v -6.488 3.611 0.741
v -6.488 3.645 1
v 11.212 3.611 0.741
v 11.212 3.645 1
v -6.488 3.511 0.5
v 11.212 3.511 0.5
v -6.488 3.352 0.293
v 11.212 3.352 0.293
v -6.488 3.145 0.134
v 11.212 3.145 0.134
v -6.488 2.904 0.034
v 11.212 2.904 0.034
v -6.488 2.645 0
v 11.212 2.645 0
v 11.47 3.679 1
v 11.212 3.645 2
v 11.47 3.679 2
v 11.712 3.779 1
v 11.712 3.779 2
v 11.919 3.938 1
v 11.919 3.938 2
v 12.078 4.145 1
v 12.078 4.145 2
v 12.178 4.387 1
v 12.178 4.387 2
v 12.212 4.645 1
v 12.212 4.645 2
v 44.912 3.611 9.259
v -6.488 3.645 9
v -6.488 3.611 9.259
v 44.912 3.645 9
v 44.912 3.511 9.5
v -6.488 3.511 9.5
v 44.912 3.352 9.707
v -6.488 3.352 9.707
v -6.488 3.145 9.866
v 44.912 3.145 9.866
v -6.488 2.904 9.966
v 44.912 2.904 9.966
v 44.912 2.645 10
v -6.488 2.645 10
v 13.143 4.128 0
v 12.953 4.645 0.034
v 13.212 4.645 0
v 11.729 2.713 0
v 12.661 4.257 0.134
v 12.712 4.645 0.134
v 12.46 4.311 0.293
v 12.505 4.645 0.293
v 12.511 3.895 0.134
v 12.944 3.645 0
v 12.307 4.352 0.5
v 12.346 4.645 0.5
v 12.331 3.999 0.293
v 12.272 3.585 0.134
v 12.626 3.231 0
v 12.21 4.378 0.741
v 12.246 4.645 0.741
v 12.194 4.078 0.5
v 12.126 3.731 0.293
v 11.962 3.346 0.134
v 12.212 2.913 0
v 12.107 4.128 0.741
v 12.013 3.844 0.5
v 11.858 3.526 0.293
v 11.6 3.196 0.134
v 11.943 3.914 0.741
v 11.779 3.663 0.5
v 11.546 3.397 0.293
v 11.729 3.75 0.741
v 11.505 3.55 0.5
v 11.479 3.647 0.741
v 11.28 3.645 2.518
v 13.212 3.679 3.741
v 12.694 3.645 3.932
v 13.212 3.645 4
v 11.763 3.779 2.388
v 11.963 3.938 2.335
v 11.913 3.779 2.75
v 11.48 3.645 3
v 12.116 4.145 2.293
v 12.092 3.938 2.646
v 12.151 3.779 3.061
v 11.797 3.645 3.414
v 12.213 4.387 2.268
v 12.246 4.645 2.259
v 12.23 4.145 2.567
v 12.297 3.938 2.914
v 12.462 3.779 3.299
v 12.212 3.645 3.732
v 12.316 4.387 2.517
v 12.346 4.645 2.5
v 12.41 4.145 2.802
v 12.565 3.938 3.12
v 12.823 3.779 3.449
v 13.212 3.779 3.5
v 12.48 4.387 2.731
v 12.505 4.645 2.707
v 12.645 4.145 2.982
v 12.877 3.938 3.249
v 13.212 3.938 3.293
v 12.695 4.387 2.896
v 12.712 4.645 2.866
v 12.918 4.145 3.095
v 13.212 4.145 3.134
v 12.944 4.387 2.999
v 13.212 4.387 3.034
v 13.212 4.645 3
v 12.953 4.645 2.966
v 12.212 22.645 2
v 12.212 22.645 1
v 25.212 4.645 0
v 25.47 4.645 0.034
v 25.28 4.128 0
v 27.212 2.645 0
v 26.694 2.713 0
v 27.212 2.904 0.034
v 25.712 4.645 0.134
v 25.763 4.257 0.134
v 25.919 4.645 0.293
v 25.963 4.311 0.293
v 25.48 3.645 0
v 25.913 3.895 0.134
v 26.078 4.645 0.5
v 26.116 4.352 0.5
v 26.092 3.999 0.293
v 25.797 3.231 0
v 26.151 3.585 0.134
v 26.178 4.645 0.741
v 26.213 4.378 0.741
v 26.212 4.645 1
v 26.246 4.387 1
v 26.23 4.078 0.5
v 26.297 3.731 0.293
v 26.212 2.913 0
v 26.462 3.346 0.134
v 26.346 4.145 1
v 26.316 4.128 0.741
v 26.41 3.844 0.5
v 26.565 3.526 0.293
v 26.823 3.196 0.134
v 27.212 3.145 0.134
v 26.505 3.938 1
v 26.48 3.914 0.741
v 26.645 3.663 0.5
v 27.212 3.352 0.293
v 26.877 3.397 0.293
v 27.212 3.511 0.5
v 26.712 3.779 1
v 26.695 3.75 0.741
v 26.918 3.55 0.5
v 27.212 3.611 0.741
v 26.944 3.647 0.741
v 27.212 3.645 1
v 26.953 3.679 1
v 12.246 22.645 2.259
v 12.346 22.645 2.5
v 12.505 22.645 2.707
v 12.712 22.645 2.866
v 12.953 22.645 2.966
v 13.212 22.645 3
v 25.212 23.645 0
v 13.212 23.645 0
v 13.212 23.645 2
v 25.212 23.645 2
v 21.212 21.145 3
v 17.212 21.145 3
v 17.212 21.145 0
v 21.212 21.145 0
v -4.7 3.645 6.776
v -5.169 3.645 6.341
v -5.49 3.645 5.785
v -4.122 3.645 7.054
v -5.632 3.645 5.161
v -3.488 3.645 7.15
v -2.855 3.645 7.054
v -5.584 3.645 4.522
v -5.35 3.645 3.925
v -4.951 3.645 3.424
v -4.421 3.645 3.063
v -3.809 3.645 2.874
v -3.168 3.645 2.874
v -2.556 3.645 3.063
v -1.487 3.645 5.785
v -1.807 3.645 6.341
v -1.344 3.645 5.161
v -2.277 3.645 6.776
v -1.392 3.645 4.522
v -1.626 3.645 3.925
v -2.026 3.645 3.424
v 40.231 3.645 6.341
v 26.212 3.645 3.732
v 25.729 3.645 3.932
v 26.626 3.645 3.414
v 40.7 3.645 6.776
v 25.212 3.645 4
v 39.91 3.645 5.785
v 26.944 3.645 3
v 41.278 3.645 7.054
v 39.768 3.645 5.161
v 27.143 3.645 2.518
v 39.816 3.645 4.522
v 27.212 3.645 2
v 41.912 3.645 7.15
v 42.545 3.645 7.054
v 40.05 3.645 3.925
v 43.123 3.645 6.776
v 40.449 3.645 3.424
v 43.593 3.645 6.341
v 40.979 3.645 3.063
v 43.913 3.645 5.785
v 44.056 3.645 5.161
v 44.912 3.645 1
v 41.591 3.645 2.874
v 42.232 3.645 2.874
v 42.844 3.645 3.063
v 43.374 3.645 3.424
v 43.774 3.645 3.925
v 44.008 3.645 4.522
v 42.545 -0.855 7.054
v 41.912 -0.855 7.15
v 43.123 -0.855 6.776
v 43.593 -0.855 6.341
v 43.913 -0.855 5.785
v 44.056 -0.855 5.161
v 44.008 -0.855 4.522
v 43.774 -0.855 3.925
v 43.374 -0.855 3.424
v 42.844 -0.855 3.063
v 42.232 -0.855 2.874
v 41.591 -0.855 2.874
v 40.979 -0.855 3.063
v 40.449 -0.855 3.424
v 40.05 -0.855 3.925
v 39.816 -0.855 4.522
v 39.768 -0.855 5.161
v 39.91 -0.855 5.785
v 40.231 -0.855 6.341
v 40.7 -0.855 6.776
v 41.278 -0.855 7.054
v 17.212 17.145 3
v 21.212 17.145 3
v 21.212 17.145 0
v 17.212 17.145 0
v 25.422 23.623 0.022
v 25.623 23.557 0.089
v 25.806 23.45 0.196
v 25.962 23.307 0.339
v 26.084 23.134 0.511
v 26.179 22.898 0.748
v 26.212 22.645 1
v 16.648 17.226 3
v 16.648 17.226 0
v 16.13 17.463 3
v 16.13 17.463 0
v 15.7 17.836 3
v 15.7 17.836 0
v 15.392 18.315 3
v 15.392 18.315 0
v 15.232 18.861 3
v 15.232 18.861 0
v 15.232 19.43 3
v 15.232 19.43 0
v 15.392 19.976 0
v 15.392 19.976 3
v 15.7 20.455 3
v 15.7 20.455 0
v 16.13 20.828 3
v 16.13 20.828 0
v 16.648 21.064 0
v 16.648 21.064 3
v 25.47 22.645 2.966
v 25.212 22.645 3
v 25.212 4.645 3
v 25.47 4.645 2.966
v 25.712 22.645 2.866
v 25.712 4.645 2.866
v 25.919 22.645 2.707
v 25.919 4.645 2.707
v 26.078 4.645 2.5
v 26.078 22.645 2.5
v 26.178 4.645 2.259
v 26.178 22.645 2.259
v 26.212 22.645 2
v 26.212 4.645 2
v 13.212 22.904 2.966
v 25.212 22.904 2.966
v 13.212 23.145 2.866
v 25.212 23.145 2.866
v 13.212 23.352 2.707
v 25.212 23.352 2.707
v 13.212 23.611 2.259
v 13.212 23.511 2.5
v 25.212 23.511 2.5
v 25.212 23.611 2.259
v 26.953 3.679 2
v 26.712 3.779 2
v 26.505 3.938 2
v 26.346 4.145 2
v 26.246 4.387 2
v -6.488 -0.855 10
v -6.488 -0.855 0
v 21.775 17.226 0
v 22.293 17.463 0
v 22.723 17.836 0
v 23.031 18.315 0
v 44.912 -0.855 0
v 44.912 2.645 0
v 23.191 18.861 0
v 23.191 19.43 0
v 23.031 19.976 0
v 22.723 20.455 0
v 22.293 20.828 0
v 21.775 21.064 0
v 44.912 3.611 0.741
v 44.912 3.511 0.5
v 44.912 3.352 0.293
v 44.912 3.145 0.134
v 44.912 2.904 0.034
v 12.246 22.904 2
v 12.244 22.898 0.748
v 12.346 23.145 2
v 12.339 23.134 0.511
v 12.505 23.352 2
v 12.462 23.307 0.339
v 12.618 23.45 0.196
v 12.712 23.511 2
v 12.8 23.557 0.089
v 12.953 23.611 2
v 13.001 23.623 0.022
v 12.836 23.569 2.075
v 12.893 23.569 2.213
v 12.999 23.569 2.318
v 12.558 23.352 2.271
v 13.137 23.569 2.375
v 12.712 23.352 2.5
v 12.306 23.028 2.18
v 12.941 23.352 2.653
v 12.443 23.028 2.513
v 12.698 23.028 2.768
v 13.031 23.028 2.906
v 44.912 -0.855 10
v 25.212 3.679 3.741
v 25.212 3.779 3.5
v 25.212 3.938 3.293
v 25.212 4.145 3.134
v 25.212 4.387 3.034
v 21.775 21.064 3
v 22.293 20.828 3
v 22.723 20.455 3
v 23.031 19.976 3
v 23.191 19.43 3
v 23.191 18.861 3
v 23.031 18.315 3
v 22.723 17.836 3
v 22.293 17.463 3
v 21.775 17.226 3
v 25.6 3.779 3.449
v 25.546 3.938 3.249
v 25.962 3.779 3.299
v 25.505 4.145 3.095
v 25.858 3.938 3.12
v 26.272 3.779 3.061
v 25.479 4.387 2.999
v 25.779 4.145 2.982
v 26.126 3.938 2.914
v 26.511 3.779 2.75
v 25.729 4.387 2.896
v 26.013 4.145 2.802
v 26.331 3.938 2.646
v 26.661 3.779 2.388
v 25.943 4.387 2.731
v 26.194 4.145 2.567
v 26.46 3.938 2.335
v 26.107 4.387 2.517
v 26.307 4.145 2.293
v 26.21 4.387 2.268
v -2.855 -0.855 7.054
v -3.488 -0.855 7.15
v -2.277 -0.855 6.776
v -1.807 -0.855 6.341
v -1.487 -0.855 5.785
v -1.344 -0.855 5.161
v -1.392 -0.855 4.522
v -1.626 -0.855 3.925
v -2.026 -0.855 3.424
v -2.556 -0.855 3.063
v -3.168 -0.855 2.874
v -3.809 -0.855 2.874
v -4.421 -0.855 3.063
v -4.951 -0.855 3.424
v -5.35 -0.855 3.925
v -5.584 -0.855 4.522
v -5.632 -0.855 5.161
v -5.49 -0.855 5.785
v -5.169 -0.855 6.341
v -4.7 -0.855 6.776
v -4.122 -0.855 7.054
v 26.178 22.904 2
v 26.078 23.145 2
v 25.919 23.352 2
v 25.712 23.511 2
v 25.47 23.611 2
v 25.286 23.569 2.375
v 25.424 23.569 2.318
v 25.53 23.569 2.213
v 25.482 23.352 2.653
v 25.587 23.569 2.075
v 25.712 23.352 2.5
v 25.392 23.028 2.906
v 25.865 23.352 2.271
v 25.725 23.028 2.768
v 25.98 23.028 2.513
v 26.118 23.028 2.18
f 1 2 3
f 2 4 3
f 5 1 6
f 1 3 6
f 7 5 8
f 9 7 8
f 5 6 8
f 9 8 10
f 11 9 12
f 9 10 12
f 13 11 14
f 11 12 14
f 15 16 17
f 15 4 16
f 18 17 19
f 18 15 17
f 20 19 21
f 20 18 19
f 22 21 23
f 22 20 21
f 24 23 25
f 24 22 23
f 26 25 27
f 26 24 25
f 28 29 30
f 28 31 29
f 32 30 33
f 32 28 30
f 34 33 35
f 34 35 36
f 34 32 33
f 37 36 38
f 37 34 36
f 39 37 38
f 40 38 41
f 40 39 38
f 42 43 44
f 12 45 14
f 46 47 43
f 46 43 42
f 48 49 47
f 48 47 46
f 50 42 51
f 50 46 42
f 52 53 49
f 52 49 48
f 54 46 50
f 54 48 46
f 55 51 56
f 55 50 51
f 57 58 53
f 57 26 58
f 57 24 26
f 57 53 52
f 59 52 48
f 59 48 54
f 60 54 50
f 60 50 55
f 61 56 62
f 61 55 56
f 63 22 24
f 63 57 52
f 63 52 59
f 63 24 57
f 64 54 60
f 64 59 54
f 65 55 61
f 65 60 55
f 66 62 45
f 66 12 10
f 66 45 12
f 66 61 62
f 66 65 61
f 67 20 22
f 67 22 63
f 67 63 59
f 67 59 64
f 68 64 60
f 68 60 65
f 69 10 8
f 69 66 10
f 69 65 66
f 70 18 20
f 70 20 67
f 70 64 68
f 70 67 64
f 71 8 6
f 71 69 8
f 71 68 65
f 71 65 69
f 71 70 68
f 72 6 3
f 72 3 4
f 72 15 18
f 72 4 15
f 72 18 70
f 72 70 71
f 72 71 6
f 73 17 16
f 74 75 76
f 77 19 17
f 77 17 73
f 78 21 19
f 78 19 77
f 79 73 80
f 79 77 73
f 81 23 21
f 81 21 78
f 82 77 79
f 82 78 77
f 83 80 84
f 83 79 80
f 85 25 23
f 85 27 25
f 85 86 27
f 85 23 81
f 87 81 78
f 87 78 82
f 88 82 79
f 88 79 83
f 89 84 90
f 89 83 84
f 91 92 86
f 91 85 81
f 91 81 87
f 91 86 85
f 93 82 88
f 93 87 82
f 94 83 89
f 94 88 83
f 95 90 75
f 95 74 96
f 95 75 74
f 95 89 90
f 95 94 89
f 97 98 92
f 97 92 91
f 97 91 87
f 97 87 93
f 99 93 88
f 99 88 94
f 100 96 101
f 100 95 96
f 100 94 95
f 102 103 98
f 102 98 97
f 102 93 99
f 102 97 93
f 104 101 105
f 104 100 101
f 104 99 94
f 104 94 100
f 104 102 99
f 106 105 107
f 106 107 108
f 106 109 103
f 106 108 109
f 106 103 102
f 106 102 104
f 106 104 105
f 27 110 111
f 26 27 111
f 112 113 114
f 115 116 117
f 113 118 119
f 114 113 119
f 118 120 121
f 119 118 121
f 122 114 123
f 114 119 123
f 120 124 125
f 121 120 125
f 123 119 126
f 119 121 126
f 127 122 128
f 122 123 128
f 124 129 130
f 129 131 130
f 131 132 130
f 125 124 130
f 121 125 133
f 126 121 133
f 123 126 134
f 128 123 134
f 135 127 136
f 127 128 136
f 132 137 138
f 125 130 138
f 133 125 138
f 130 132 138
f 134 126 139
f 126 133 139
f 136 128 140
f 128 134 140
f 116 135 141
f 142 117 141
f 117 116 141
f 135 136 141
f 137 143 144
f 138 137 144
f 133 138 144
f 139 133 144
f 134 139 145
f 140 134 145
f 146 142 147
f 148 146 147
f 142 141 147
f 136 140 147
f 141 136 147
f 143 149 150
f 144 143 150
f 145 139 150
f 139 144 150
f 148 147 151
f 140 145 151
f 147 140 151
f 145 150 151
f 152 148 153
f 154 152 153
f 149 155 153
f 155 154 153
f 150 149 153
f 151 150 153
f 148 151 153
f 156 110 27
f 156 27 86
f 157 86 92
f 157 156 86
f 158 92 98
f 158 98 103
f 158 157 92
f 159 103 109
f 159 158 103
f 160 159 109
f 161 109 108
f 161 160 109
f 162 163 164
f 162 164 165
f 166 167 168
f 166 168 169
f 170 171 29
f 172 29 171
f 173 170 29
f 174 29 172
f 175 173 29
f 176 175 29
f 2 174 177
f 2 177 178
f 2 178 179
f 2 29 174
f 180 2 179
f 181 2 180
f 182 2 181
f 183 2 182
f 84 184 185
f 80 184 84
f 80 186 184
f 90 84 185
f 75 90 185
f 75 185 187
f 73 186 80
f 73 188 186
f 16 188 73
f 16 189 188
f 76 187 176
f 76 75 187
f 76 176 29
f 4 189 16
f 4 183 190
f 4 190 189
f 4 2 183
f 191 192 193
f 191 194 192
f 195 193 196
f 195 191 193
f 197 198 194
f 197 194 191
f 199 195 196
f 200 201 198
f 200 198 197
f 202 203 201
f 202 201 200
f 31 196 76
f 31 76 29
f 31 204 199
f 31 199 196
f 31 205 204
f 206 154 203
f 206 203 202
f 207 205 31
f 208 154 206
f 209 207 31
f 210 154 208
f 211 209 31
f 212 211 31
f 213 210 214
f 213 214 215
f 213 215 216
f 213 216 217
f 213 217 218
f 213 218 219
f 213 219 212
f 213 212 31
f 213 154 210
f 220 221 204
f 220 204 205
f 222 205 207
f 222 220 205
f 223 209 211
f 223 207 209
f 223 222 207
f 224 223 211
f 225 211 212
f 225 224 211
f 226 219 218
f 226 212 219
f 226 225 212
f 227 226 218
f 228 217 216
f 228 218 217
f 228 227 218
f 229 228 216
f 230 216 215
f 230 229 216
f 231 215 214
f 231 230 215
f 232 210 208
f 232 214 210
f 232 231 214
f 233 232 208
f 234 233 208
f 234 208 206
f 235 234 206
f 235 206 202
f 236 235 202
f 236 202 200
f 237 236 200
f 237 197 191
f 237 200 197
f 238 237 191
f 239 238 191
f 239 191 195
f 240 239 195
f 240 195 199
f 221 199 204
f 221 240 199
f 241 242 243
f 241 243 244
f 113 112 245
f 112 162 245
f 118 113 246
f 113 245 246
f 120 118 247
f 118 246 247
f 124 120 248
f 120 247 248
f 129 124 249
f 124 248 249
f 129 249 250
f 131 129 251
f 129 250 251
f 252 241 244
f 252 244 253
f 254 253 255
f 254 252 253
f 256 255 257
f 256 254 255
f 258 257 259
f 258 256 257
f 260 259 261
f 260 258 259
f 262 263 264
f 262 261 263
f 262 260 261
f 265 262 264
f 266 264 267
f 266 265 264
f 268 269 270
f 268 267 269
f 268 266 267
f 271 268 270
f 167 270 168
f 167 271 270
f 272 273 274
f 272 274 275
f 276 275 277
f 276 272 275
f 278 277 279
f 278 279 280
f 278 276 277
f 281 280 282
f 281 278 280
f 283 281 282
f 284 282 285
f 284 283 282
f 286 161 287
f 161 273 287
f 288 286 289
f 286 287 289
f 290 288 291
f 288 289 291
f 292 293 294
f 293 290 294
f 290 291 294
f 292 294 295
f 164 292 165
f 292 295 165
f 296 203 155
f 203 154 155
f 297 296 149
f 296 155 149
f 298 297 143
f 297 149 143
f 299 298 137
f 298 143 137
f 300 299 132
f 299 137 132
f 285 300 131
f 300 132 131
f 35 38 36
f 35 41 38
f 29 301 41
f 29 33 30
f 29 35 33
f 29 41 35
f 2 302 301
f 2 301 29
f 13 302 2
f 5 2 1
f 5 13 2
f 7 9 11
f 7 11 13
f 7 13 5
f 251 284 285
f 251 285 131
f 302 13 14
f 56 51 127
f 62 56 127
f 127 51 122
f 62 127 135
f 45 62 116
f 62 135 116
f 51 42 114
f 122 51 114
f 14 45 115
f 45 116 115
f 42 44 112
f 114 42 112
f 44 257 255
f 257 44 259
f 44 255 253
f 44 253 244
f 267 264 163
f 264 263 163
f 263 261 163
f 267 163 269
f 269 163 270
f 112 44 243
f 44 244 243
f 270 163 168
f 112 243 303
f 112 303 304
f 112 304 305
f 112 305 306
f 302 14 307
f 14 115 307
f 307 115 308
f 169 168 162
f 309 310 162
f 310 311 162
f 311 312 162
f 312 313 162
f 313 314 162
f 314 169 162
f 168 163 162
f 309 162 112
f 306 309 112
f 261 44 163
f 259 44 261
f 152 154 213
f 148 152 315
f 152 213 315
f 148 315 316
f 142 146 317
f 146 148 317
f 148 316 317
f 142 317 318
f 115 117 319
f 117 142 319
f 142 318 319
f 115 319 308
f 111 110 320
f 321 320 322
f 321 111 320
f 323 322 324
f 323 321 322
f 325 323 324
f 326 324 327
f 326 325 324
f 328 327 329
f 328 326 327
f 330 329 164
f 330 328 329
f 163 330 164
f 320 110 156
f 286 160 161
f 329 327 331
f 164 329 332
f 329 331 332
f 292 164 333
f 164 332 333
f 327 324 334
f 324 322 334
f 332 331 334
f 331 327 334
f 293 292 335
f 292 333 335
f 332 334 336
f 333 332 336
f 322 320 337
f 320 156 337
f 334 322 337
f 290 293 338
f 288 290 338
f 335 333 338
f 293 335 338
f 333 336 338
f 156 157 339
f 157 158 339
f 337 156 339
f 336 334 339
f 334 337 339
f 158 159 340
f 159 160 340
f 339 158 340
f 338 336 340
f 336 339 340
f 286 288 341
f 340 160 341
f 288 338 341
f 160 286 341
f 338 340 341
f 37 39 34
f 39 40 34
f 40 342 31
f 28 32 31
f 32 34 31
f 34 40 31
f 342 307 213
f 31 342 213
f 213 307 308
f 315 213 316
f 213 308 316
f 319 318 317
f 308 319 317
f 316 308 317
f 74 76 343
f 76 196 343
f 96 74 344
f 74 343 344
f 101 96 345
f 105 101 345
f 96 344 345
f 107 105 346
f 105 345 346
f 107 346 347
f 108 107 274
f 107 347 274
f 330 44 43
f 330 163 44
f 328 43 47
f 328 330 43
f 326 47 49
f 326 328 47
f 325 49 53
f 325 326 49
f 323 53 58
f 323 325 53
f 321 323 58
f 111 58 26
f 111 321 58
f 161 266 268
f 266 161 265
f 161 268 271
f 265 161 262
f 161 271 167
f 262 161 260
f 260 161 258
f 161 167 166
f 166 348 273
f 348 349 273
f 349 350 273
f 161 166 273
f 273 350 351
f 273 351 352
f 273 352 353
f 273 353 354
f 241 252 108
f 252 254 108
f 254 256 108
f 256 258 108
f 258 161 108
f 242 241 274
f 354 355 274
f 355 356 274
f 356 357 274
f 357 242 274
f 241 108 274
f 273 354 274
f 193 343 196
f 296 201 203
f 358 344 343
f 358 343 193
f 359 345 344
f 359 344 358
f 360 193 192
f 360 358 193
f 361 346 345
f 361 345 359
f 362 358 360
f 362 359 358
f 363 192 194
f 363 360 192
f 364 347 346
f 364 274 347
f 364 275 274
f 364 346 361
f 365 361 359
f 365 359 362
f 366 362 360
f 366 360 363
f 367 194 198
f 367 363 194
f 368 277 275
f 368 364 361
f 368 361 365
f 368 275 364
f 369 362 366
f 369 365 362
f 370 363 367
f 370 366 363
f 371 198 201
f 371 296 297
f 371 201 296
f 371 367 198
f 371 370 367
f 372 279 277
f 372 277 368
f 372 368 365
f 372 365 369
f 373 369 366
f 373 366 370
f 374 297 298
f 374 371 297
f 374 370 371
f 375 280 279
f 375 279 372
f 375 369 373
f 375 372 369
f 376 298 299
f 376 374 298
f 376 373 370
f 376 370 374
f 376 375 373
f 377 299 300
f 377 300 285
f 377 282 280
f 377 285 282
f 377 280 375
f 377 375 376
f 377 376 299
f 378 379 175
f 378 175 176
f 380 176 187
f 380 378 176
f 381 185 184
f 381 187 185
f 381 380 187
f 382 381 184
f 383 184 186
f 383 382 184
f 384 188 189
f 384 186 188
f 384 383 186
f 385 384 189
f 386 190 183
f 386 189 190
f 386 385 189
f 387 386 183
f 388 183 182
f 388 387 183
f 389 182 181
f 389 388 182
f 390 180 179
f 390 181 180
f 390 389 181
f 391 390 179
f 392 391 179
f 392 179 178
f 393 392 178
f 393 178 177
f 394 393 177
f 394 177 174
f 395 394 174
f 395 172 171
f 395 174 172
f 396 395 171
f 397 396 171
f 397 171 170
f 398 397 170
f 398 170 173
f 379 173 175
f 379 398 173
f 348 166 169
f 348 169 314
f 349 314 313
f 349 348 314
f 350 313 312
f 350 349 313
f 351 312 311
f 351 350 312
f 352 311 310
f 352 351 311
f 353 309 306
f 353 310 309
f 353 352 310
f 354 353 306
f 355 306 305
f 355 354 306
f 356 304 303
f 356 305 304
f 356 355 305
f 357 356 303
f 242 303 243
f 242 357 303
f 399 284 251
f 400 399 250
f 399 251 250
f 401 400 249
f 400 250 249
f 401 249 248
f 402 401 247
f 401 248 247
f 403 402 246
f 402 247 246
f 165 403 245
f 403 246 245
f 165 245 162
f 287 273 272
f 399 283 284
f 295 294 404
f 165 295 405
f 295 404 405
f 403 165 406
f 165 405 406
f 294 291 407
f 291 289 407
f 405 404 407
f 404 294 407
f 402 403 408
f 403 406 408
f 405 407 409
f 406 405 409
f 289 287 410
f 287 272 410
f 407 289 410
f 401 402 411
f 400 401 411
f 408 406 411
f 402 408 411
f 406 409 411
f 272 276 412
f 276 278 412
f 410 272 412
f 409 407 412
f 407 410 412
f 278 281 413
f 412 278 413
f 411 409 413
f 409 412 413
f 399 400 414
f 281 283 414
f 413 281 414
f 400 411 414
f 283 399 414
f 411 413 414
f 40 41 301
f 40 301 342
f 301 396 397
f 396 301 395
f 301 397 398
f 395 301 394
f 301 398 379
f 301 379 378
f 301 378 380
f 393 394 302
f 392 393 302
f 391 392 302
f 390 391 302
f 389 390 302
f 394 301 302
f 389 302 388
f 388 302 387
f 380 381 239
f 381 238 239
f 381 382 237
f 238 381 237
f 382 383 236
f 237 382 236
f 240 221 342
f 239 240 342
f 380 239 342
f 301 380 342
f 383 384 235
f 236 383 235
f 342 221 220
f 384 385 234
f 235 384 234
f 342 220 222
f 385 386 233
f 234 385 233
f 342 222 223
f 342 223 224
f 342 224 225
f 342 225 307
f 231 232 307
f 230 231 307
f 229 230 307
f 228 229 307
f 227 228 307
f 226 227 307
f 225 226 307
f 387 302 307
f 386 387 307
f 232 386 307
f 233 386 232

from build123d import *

# Parameters (mm, degrees)
SKETCH1_W               = 51.4
SKETCH1_H               = 4.5
BOSS_EXTRUDE1_DEPTH     = 10
CUT_EXTRUDE1_DEPTH      = 47.230988755
CUT_EXTRUDE1_DEPTH_BACK = 47.230988755
SKETCH2_R               = 2.15
SKETCH3_W               = 14
SKETCH3_H               = 3
BOSS_EXTRUDE2_DEPTH     = 20
CUT_EXTRUDE2_DEPTH      = 20
FILLET1_R               = 1


with BuildPart() as part:
    # Sketch1 → Boss-Extrude1 (new body)
    with BuildSketch(Plane.XY):
        with Locations((19.211627907, 1.395348837)):
            Rectangle(SKETCH1_W, SKETCH1_H)
    extrude(amount=BOSS_EXTRUDE1_DEPTH)

    # Sketch2 → Cut-Extrude1 (cut, two sides: drawn at the far end of the back side and taken through both)
    with BuildSketch(Plane(origin=(0, 3.645348837, 0), x_dir=(1, 0, 0), z_dir=(0, 1, 0)).offset(-CUT_EXTRUDE1_DEPTH_BACK)):
        with Locations(Location((-3.488372093, -5, 0), (0, 0, 270))):
            Circle(SKETCH2_R)
        with Locations(Location((41.911627907, -5, 0), (0, 0, 270))):
            Circle(SKETCH2_R)
    extrude(amount=CUT_EXTRUDE1_DEPTH + CUT_EXTRUDE1_DEPTH_BACK, mode=Mode.SUBTRACT)

    # Sketch3 → Boss-Extrude2 (add)
    with BuildSketch(Plane(origin=(0, 3.645348837, 0), x_dir=(1, 0, 0), z_dir=(0, 1, 0))):
        with Locations((19.211627907, -1.5)):
            Rectangle(SKETCH3_W, SKETCH3_H)
    extrude(amount=BOSS_EXTRUDE2_DEPTH)

    # Sketch4 → Cut-Extrude2 (cut)
    with BuildSketch(Plane.XY.offset(3)):
        with BuildLine():
            Line((17.211627907, 21.145348837), (21.211627907, 21.145348837))
            ThreePointArc((21.211627907, 21.145348837), (23.211627907, 19.145348837), (21.211627907, 17.145348837))
            Line((21.211627907, 17.145348837), (17.211627907, 17.145348837))
            ThreePointArc((17.211627907, 17.145348837), (15.211627907, 19.145348837), (17.211627907, 21.145348837))
        make_face()
    extrude(amount=-CUT_EXTRUDE2_DEPTH, mode=Mode.SUBTRACT)

    # Fillet1
    fillet1_edges = [part.edges().sort_by_distance(p)[0] for p in [
        (19.211627907, 3.645348837, 10),
        (2.861627907, 3.645348837, 0),
        (12.211627907, 3.645348837, 1.5),
        (12.211627907, 13.645348837, 0),
        (19.211627907, 3.645348837, 3),
        (12.211627907, 13.645348837, 3),
        (26.211627907, 3.645348837, 1.5),
        (26.211627907, 13.645348837, 3),
        (26.211627907, 13.645348837, 0),
        (12.211627907, 23.645348837, 1.5),
        (19.211627907, 23.645348837, 3),
        (26.211627907, 23.645348837, 1.5),
        (35.561627907, 3.645348837, 0),
    ]]
    fillet(fillet1_edges, radius=FILLET1_R)


solid = part.part
